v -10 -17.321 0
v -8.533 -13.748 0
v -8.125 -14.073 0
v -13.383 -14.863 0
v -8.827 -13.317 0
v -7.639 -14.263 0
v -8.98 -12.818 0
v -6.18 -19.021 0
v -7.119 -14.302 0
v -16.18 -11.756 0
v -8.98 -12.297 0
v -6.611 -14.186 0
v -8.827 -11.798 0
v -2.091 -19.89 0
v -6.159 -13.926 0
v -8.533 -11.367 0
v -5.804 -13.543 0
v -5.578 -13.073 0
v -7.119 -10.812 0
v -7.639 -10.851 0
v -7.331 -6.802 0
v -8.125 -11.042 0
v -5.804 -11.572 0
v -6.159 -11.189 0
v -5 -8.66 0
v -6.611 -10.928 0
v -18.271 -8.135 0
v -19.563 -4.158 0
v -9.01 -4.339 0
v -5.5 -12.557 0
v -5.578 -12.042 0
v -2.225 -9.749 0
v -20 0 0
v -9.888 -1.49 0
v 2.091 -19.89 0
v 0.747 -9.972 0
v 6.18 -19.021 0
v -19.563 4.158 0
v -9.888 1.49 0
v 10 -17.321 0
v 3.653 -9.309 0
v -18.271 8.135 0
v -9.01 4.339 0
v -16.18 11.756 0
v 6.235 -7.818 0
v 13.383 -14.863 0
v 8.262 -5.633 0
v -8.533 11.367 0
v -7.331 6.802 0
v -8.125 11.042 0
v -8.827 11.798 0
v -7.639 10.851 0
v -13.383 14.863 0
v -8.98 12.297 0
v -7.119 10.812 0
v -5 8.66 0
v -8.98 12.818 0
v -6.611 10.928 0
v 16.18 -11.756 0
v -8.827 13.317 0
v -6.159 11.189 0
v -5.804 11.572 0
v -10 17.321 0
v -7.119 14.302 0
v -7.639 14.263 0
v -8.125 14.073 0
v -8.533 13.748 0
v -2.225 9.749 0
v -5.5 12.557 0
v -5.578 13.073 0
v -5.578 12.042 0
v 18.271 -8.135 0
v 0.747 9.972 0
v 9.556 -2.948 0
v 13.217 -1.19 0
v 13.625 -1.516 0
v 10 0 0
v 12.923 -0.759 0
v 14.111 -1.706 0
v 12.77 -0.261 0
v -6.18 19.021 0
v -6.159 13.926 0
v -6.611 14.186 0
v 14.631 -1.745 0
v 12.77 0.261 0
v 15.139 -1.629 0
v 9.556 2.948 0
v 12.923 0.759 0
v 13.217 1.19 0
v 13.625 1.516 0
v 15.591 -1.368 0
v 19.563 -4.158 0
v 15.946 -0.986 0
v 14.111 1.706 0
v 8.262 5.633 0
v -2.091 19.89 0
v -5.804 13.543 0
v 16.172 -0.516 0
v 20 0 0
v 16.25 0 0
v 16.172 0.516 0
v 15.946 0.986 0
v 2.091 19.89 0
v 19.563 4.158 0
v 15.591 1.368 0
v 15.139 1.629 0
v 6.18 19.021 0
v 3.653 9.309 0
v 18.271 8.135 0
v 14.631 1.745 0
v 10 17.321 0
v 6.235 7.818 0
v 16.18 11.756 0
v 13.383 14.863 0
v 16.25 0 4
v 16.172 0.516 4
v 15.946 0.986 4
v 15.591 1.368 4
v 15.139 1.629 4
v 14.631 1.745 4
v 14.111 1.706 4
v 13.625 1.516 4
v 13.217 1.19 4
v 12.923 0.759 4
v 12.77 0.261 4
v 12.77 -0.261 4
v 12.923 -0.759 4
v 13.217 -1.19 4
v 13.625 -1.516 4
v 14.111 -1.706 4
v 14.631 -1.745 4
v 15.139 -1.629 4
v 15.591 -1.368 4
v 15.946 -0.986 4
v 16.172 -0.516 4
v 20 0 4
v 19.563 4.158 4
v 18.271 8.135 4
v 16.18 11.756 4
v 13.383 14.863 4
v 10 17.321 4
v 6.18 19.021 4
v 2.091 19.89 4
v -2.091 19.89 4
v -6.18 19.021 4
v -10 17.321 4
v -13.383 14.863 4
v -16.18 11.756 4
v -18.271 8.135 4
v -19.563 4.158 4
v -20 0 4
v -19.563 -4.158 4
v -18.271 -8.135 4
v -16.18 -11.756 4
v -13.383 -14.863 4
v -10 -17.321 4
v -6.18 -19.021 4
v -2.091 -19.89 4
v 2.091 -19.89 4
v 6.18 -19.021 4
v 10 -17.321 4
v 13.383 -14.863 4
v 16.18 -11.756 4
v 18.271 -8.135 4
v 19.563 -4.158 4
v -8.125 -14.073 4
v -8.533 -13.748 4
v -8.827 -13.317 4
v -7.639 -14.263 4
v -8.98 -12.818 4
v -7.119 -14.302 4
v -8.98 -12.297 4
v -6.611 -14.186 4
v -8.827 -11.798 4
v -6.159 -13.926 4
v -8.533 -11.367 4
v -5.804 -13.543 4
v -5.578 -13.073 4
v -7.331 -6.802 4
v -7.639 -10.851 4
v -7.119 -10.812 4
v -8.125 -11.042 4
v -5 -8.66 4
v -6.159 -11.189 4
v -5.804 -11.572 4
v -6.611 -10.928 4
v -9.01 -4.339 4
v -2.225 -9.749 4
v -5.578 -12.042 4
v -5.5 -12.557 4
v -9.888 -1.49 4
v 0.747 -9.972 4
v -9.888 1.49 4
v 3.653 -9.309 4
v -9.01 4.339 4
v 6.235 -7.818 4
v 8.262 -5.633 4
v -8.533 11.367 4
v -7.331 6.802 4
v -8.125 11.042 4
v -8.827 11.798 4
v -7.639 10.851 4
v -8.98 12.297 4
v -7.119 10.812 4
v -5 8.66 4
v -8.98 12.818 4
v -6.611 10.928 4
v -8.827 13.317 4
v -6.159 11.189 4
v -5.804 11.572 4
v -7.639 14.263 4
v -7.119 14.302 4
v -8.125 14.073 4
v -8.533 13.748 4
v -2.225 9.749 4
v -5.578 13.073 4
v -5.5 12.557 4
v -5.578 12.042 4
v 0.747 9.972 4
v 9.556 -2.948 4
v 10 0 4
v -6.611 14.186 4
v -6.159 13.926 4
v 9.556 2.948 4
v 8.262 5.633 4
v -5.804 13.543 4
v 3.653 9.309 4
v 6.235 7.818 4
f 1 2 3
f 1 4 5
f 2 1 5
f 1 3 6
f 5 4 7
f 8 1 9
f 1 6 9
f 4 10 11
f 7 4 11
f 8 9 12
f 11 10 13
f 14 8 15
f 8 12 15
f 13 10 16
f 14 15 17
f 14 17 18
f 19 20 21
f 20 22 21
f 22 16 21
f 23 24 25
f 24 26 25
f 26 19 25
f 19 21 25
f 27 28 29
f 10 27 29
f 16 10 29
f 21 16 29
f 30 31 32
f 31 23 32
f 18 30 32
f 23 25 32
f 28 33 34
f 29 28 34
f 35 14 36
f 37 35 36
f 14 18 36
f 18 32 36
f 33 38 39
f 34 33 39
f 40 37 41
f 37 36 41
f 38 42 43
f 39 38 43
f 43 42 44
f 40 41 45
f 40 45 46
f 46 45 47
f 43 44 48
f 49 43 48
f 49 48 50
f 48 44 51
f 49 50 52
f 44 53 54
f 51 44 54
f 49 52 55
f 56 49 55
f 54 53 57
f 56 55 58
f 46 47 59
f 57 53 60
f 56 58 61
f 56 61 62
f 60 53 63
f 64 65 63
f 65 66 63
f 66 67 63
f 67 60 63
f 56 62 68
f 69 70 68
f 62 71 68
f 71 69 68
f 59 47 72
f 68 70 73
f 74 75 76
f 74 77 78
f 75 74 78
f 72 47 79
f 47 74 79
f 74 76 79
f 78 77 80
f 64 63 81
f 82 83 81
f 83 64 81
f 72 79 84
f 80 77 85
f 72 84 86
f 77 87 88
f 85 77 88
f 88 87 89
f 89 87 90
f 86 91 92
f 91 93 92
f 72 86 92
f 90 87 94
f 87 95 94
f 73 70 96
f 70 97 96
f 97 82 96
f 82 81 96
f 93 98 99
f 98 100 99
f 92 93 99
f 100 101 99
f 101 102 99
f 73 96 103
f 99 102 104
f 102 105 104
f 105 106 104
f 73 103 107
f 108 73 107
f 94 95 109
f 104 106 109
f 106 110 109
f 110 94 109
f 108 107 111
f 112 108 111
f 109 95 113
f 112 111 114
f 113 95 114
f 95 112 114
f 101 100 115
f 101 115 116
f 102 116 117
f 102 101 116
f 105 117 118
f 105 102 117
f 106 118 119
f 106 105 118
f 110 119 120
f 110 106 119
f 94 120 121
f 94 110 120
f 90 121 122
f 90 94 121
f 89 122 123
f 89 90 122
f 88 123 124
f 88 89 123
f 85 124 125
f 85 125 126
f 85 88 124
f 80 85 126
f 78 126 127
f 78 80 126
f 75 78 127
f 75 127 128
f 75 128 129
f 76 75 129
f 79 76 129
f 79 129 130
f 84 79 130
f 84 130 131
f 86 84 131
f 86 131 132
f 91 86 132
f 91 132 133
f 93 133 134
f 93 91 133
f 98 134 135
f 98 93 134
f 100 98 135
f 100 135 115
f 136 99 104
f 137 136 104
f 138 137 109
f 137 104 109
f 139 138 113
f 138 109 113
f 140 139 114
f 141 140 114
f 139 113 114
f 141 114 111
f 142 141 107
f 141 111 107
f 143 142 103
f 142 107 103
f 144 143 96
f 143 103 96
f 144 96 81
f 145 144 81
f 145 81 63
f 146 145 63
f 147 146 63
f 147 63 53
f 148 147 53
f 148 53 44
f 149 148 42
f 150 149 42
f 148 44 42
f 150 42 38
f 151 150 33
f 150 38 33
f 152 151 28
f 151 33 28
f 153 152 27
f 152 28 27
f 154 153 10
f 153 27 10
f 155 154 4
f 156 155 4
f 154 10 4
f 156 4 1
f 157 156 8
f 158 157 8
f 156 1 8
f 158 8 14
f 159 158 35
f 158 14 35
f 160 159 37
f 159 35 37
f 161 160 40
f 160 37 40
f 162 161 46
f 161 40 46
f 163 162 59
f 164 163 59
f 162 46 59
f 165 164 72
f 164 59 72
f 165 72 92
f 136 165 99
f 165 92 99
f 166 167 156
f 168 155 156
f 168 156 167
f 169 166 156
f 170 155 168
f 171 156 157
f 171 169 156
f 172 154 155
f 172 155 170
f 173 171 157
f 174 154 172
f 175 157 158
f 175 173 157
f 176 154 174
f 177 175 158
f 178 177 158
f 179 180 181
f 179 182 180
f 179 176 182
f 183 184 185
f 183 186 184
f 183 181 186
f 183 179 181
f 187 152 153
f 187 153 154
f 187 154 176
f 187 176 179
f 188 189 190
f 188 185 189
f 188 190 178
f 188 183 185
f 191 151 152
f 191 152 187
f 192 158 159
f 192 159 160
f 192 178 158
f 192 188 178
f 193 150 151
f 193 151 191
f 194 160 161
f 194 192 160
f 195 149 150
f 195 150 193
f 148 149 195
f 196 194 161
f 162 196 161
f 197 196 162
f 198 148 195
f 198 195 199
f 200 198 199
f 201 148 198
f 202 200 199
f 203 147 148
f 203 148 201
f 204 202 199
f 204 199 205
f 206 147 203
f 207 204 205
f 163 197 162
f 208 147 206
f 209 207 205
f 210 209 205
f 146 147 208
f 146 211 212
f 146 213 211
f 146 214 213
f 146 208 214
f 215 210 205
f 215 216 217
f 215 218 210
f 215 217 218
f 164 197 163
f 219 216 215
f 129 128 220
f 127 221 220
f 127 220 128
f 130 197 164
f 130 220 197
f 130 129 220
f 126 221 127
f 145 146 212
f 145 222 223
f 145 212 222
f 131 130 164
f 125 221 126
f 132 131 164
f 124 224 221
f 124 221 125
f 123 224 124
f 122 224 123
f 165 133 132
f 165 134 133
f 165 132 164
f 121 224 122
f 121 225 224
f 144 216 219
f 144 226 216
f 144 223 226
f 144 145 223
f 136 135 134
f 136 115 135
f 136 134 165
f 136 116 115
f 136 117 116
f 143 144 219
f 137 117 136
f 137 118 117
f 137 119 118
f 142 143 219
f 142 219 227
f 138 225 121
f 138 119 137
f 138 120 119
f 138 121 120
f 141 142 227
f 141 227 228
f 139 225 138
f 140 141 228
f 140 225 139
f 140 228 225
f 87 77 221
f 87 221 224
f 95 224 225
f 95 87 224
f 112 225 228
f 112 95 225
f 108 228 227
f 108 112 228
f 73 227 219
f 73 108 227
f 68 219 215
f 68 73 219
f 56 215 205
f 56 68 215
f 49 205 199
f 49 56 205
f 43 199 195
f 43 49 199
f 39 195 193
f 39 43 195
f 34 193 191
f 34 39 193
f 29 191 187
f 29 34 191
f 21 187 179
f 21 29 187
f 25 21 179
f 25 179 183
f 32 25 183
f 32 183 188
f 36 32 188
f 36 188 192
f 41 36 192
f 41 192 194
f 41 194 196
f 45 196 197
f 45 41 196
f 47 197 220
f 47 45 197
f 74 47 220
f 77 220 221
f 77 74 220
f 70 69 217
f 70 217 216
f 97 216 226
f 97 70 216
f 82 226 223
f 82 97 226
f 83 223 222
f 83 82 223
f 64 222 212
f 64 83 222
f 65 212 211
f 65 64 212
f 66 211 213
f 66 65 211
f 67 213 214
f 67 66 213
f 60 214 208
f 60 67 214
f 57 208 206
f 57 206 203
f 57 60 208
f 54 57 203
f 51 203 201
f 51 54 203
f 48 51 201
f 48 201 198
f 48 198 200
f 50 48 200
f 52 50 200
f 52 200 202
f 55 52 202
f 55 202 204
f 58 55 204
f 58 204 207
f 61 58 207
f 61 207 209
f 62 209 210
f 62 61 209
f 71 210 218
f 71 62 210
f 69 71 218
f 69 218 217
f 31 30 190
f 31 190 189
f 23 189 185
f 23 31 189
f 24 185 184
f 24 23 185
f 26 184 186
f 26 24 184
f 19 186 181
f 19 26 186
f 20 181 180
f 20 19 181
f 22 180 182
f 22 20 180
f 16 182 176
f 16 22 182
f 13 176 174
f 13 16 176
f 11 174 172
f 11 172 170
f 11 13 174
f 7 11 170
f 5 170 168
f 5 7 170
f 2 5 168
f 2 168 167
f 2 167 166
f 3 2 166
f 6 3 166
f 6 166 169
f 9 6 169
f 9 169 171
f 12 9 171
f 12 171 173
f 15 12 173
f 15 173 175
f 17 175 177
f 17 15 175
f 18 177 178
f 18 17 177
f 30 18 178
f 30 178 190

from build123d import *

# Parameters (mm, degrees)
SKETCH1_R           = 20
SKETCH1_R_2         = 10
SKETCH1_R_3         = 1.75
BOSS_EXTRUDE1_DEPTH = 4


with BuildPart() as part:
    # Sketch1 → Boss-Extrude1 (new body)
    with BuildSketch(Plane.XY):
        Circle(SKETCH1_R)
        Circle(SKETCH1_R_2, mode=Mode.SUBTRACT)
        with Locations((14.5, 0)):
            Circle(SKETCH1_R_3, mode=Mode.SUBTRACT)
        with Locations((-7.25, -12.557368355)):
            Circle(SKETCH1_R_3, mode=Mode.SUBTRACT)
        with Locations((-7.25, 12.557368355)):
            Circle(SKETCH1_R_3, mode=Mode.SUBTRACT)
    extrude(amount=BOSS_EXTRUDE1_DEPTH)


solid = part.part
